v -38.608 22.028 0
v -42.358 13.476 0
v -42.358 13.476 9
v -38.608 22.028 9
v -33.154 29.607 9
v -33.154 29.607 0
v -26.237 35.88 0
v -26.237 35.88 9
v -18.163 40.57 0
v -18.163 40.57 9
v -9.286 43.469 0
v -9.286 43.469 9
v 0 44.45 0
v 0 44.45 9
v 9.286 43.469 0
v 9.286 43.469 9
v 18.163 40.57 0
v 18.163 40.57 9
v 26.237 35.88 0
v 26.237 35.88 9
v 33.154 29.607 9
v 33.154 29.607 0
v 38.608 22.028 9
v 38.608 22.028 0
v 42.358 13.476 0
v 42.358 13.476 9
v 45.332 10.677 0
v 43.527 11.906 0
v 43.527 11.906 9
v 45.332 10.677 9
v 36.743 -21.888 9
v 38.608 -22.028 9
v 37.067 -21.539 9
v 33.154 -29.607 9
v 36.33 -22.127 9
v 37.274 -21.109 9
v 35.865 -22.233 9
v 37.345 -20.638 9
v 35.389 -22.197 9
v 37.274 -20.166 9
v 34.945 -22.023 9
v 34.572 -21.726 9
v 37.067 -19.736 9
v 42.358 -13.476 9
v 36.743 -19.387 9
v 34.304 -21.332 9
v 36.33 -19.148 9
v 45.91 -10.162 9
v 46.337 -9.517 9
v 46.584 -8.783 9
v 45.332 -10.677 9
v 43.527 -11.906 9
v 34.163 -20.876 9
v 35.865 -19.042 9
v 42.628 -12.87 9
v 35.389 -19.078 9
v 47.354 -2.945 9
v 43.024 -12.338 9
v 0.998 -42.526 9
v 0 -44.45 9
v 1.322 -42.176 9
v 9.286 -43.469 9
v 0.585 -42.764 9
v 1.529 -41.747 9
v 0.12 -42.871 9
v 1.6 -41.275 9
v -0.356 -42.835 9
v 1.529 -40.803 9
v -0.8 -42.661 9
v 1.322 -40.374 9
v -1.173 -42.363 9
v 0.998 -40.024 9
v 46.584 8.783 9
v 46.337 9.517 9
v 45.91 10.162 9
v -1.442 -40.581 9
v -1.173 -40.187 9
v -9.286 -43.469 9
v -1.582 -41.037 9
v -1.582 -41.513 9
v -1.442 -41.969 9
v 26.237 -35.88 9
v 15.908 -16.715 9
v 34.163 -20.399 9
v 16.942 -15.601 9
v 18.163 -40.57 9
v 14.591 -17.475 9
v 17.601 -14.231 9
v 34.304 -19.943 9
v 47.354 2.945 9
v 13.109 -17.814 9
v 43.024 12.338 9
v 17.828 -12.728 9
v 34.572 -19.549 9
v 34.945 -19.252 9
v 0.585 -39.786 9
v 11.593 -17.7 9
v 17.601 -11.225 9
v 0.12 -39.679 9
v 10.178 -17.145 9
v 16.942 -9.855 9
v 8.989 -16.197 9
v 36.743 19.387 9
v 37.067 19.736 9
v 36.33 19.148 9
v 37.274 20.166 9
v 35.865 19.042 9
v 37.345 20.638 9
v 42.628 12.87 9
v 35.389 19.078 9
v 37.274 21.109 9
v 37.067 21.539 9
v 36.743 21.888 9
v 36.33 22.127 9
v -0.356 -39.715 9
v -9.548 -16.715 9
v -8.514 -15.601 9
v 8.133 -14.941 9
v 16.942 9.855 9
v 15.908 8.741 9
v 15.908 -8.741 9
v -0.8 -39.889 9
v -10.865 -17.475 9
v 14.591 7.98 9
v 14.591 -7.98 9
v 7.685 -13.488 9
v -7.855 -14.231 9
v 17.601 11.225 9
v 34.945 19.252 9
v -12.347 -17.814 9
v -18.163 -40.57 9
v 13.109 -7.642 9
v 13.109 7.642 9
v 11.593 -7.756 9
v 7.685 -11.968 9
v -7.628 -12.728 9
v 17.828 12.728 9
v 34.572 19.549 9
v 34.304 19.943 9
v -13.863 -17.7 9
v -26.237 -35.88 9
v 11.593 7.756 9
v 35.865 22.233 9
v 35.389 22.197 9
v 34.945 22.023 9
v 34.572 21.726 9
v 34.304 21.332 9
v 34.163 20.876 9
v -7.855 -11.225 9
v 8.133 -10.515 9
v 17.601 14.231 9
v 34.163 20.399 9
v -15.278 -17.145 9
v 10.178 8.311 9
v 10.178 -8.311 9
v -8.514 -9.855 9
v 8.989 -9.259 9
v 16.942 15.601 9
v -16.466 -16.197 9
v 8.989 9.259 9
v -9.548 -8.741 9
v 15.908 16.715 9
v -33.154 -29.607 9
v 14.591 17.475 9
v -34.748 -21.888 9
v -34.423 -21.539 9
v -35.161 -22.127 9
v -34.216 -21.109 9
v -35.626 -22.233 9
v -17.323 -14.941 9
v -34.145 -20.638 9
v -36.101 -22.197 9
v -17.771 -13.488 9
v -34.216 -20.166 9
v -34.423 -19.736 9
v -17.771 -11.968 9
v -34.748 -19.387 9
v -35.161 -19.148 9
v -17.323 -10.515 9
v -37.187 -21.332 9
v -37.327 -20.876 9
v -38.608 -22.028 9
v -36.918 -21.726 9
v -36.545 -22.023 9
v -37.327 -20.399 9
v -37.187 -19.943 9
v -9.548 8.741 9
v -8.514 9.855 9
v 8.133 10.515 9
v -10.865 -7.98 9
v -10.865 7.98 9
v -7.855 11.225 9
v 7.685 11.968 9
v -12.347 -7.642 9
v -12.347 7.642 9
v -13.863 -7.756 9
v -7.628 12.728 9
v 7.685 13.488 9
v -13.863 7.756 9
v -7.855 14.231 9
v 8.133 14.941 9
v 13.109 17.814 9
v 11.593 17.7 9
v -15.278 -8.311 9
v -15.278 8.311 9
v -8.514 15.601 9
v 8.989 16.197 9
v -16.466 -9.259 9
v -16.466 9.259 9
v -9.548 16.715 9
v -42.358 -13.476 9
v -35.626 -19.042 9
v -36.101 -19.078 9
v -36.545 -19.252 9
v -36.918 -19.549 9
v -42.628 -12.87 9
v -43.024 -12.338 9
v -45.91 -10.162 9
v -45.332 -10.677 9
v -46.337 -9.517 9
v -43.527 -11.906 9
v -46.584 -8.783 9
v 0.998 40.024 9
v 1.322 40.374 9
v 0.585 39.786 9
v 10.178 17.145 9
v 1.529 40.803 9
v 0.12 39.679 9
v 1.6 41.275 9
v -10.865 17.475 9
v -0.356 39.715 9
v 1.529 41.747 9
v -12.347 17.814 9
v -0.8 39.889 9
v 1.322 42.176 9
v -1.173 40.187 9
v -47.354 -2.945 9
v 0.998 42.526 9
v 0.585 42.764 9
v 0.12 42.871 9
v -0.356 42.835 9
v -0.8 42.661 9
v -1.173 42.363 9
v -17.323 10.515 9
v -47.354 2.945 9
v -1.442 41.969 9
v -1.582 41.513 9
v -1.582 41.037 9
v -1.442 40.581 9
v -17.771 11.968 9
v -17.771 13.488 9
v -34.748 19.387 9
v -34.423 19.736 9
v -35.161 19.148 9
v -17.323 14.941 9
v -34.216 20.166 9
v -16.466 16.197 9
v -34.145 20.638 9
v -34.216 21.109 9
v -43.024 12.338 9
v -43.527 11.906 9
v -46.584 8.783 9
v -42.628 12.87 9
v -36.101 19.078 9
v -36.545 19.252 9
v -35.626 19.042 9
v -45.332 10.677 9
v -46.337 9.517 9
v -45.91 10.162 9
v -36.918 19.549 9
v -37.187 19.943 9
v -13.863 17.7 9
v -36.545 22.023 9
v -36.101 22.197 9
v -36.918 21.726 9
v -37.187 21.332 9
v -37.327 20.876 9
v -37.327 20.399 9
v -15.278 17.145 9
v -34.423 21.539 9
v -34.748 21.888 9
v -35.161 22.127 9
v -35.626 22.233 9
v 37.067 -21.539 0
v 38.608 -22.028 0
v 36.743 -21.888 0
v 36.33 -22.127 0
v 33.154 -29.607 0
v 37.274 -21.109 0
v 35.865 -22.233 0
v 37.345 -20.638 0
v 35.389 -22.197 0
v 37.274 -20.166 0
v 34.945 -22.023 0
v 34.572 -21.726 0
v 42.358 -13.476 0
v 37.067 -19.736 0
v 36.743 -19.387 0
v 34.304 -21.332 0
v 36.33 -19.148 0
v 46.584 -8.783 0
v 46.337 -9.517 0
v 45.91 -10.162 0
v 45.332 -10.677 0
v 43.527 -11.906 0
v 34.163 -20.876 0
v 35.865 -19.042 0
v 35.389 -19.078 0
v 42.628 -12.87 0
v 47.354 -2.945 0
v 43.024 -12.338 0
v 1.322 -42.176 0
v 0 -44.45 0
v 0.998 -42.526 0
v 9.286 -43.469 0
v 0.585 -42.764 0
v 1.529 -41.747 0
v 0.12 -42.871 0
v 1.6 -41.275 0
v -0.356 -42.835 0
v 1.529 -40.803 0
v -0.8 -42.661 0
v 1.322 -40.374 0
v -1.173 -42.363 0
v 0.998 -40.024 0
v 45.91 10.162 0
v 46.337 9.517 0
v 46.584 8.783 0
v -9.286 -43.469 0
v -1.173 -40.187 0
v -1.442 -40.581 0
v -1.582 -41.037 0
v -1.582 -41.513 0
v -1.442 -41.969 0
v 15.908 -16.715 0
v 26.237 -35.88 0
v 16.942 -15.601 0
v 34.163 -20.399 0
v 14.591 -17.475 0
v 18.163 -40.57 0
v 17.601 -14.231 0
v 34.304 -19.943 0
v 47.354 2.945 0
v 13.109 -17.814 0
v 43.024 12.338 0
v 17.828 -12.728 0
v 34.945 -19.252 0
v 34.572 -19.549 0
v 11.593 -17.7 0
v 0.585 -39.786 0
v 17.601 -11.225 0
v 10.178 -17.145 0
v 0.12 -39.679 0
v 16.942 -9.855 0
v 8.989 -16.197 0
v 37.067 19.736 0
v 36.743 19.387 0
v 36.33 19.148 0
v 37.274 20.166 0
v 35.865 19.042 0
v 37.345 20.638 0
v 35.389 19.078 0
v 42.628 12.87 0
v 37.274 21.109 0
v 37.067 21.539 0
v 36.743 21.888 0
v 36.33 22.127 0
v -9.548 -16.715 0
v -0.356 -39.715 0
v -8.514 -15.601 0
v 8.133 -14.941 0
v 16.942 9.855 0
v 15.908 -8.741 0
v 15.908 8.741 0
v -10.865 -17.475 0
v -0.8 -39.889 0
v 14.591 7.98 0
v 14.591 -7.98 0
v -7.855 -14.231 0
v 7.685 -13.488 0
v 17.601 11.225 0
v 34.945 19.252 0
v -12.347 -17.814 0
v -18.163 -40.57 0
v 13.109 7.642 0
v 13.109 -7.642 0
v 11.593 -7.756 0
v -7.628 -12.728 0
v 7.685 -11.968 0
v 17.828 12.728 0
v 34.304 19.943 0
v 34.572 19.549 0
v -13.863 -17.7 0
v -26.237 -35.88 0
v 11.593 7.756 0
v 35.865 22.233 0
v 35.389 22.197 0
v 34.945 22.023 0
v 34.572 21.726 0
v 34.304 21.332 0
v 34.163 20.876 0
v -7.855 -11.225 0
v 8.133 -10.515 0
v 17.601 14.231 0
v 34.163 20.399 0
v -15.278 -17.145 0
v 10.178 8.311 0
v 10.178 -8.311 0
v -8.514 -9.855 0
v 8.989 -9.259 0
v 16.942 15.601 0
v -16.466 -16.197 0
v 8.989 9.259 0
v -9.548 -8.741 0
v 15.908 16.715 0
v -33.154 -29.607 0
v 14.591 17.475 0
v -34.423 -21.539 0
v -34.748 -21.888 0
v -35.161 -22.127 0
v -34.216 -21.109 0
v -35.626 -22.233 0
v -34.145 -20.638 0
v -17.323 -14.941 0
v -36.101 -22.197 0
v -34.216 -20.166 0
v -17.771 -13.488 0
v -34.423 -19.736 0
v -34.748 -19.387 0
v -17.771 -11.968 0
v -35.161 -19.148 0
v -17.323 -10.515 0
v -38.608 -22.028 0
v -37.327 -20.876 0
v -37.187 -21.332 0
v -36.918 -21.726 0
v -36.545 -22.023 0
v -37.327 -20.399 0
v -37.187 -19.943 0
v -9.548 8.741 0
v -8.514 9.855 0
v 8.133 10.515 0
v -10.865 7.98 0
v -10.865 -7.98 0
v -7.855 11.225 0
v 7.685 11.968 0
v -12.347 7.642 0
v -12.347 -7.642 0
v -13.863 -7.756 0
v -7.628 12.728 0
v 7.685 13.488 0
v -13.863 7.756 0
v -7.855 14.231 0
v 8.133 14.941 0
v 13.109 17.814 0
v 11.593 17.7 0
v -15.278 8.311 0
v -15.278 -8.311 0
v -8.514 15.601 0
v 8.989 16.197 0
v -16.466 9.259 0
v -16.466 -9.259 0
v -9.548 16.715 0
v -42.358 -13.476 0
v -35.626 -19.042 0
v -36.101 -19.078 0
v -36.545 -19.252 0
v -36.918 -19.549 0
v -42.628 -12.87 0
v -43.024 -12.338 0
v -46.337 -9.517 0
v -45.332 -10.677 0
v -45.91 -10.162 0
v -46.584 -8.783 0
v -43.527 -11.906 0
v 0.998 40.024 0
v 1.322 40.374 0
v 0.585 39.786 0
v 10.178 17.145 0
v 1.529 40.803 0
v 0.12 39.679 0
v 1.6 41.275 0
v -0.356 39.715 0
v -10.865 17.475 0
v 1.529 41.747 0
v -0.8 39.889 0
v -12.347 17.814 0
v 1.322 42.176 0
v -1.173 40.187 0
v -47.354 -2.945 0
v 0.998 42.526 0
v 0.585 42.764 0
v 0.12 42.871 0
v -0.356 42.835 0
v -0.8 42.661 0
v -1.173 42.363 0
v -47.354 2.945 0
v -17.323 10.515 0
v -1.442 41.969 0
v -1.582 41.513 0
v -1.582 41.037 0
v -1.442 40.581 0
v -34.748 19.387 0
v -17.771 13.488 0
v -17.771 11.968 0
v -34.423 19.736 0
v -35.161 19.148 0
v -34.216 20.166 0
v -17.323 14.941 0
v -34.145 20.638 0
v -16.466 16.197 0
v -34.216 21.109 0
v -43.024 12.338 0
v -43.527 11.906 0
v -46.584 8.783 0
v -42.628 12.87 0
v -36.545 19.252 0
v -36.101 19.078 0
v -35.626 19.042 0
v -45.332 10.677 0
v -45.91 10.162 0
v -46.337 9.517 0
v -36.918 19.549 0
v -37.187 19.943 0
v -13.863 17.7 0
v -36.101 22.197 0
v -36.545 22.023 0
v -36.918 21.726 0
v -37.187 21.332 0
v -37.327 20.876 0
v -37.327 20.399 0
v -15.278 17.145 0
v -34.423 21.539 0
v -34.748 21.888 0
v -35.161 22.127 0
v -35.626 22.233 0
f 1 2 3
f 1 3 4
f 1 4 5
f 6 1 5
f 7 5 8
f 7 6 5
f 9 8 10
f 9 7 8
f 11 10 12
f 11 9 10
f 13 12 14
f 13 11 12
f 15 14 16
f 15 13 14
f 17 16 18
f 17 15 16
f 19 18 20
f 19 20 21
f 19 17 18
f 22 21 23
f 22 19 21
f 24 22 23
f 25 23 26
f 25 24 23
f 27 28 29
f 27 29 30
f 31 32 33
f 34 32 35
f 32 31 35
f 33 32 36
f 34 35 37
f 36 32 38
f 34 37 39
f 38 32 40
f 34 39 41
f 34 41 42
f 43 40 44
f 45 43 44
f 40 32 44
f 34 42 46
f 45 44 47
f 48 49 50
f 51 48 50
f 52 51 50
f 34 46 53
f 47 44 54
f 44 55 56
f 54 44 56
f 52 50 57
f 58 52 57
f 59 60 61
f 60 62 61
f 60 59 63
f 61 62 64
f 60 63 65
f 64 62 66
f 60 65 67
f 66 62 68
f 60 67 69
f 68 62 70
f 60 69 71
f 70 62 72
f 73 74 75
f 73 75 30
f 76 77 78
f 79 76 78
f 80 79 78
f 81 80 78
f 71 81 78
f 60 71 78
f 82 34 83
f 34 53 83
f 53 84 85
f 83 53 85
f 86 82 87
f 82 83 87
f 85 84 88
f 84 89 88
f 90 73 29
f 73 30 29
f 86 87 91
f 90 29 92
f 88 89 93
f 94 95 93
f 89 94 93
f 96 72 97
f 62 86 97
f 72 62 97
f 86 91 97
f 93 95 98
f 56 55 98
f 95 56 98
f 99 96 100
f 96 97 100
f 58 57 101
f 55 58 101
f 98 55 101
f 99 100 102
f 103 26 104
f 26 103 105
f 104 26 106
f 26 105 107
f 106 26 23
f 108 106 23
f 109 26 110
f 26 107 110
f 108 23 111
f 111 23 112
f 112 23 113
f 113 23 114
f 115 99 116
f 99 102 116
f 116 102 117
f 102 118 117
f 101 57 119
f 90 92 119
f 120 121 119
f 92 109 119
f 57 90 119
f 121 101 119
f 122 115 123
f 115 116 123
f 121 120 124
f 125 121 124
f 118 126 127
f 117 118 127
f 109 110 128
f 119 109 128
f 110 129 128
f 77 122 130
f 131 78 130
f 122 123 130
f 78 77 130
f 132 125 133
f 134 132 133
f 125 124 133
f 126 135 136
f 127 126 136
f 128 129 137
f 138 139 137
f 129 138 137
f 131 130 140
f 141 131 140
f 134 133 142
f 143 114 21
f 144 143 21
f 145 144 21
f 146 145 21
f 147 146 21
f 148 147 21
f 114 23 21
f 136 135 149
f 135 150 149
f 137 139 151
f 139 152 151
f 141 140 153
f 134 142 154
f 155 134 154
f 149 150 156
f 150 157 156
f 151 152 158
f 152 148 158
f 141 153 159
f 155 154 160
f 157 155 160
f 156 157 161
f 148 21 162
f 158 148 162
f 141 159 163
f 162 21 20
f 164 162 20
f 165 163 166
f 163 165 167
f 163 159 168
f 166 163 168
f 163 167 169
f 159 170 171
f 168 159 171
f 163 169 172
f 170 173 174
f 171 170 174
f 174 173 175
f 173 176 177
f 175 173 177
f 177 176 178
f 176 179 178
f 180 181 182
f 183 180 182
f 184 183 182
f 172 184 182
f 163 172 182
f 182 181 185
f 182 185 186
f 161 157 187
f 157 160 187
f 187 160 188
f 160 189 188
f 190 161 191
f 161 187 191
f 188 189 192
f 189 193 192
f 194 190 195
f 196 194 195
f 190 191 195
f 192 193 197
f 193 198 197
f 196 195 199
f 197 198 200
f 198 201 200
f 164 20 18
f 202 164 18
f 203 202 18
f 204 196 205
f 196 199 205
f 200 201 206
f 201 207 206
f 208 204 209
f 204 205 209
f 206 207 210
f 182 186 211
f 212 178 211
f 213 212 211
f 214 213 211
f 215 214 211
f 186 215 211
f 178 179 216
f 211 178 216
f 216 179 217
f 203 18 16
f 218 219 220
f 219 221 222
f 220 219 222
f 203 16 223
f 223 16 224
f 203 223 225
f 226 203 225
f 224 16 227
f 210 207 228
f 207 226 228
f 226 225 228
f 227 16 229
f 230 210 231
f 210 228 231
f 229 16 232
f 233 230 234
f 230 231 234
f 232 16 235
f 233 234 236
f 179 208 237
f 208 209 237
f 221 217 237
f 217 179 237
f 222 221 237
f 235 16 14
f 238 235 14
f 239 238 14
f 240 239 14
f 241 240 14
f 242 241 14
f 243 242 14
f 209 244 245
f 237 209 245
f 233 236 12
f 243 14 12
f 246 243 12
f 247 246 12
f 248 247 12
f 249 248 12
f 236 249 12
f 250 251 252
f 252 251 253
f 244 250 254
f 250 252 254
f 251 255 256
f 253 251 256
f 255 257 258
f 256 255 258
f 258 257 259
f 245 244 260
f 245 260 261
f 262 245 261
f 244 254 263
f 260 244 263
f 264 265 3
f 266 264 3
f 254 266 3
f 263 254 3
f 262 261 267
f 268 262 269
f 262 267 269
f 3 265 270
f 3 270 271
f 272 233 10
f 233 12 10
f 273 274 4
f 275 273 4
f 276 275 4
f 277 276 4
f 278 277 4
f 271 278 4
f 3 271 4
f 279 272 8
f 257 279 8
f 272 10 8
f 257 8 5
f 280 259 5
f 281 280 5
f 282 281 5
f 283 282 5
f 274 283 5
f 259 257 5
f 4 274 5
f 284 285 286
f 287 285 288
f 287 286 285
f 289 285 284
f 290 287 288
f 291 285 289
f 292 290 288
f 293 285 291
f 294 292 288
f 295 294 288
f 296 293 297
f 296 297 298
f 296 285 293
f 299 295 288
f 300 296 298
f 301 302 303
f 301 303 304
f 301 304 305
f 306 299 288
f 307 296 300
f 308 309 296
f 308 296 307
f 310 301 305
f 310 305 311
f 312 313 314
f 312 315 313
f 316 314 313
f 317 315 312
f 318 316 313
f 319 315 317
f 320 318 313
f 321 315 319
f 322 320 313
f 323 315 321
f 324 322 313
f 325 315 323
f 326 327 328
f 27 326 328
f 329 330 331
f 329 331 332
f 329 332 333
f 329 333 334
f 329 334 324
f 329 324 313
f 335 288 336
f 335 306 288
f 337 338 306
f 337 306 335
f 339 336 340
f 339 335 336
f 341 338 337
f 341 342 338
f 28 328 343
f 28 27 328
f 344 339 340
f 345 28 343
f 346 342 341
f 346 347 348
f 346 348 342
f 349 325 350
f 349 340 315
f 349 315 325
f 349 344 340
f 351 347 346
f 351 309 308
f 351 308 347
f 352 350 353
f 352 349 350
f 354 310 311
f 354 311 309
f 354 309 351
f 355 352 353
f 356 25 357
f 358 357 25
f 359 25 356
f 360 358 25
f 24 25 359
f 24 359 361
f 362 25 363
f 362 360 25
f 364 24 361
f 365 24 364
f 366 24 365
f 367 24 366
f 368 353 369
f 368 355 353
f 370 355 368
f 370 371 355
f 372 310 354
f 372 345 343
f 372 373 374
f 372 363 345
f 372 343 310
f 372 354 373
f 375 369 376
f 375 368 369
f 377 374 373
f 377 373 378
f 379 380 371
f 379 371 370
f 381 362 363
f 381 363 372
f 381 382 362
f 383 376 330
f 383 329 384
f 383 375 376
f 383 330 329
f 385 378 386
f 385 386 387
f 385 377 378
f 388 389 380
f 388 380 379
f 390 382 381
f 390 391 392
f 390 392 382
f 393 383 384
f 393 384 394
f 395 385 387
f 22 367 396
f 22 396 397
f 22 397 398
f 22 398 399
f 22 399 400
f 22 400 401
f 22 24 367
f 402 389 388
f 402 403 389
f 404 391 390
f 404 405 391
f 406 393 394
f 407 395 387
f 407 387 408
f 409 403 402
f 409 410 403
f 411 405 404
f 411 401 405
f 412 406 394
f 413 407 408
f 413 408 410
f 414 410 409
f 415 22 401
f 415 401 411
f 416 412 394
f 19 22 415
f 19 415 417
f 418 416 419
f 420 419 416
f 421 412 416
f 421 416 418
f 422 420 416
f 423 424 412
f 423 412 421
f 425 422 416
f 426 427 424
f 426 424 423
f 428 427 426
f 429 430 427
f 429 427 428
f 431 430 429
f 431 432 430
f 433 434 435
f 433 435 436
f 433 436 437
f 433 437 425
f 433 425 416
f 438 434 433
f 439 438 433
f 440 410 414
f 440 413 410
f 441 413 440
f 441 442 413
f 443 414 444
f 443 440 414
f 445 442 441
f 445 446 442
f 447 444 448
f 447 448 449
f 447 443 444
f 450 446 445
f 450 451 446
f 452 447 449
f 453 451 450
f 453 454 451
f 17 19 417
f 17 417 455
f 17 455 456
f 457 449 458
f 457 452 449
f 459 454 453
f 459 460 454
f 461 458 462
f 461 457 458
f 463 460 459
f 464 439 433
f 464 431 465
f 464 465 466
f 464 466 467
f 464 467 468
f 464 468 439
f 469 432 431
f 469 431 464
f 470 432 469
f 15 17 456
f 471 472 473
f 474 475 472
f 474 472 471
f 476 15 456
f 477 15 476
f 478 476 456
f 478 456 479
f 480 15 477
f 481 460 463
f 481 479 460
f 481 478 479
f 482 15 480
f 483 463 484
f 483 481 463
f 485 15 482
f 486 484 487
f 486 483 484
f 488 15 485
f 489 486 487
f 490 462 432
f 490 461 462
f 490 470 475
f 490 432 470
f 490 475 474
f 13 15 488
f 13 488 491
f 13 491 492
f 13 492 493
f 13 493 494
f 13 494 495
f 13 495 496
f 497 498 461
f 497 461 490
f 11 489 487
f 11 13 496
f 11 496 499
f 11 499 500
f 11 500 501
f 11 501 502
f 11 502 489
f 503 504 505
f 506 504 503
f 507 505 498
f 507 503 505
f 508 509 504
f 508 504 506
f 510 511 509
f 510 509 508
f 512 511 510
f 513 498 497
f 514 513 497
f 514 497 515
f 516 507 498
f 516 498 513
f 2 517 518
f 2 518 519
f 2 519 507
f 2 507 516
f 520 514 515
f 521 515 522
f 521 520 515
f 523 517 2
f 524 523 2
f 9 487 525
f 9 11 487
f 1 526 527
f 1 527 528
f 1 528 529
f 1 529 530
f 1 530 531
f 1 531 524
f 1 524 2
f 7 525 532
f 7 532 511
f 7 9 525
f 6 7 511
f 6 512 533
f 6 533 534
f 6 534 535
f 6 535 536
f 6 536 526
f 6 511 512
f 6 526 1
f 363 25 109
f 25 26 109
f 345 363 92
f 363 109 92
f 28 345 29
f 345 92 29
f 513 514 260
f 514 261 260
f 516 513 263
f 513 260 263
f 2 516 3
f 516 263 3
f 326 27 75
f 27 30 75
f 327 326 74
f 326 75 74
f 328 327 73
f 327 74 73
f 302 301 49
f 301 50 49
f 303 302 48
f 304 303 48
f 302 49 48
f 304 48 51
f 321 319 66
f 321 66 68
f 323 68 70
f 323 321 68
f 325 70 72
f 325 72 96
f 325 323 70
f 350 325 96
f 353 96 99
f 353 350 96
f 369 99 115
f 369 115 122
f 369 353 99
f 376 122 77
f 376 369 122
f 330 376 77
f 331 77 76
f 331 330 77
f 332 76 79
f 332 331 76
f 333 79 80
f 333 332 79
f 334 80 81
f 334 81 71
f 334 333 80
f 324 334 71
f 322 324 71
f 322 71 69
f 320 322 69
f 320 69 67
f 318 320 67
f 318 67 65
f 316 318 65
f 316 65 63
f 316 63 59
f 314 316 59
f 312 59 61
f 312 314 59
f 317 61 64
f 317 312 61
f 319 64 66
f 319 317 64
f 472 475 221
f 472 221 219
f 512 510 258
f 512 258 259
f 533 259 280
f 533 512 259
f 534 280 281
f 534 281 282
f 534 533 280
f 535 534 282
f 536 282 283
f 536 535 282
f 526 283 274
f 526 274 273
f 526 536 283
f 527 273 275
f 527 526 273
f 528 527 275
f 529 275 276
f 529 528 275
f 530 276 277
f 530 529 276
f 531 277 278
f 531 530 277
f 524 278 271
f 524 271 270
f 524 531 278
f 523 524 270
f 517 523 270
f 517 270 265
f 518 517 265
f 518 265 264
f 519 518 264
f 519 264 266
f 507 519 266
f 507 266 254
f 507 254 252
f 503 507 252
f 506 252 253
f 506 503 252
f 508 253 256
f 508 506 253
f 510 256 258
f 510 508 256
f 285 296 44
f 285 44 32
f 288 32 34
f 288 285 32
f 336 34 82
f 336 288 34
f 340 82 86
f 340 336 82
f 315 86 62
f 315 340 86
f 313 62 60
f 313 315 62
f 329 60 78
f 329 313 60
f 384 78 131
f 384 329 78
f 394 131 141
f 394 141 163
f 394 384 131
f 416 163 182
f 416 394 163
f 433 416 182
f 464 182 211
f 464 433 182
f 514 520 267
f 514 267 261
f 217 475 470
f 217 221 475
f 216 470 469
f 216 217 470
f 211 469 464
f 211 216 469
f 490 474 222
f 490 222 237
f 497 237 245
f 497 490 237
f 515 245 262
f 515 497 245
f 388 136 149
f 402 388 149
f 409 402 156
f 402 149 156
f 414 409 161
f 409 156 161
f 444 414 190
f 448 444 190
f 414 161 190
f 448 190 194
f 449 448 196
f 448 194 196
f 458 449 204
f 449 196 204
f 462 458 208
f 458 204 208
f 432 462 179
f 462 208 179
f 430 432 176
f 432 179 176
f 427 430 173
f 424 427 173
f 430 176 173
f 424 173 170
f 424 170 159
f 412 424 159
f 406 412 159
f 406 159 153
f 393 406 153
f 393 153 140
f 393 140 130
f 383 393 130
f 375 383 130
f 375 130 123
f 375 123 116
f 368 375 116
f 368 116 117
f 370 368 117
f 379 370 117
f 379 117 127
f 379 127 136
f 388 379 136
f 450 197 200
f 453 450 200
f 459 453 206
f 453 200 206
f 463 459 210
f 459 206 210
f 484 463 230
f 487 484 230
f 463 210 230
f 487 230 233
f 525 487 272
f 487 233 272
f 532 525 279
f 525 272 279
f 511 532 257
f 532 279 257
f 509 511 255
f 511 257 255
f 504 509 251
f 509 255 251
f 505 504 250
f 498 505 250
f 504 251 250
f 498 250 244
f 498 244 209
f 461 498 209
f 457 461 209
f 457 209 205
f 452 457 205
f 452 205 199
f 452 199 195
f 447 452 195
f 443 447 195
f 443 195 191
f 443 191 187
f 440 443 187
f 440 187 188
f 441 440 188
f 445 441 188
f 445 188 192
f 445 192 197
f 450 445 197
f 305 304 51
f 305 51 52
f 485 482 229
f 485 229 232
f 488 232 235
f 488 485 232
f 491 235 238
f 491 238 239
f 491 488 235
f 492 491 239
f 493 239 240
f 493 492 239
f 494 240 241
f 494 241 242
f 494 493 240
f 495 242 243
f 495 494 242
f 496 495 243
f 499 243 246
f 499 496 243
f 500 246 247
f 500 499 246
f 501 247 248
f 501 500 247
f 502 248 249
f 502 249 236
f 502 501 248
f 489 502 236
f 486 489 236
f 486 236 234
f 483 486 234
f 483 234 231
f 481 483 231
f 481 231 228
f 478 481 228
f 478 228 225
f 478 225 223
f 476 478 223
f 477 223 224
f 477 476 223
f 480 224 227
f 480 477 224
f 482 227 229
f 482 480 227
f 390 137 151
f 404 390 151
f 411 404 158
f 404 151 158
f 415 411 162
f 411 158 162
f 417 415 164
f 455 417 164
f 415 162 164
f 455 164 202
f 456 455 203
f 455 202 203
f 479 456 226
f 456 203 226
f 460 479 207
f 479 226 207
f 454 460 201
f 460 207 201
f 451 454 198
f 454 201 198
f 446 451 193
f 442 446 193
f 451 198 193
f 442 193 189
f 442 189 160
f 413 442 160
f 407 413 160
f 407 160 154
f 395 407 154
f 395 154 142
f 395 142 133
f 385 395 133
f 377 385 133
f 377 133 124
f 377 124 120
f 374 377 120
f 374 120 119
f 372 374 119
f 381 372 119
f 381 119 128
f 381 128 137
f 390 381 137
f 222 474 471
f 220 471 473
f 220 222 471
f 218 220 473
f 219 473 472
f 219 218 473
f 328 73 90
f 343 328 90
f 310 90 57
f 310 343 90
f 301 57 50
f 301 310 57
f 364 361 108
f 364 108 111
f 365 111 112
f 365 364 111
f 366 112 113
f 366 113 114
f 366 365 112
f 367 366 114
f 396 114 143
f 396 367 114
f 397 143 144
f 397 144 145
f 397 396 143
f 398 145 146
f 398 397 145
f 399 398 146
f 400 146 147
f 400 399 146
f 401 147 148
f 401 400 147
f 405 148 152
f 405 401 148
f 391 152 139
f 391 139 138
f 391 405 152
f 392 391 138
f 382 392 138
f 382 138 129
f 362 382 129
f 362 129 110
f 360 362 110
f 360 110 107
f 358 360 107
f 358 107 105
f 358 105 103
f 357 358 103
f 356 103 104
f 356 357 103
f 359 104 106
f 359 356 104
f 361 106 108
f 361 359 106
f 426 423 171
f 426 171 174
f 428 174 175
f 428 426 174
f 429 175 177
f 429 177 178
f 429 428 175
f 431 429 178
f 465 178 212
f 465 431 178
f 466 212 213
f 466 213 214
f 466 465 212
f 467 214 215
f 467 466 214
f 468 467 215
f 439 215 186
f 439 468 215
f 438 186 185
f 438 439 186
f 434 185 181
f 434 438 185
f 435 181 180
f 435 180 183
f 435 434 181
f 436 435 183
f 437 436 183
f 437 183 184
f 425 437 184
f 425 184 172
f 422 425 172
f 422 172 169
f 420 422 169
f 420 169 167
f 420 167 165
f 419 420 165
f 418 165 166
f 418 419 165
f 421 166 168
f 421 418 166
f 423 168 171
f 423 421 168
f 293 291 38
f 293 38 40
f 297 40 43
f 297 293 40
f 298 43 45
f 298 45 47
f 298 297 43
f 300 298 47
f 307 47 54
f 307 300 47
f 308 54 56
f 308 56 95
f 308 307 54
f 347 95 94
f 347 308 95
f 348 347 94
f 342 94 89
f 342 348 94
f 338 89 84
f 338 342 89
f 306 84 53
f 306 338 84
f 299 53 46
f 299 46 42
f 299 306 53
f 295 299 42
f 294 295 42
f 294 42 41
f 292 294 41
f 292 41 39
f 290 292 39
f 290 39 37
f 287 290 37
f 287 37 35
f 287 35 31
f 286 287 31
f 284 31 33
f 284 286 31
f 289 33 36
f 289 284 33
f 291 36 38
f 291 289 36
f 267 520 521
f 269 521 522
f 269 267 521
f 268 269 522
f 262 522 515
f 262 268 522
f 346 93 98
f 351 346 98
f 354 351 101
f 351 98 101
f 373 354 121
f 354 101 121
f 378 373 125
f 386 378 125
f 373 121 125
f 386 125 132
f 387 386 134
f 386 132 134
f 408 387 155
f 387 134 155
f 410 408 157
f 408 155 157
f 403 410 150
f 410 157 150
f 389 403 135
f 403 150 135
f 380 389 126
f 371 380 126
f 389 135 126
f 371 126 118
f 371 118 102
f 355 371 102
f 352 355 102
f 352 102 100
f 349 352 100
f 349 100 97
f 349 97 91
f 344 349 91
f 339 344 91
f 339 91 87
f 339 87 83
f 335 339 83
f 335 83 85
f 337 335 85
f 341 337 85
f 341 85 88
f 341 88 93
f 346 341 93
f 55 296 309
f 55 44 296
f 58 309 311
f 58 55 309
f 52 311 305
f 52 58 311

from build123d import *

# Parameters (mm, degrees)
SKETCH1_R           = 1.6
BOSS_EXTRUDE1_DEPTH = 9
FILLET1_R           = 3
SKETCH2_R           = 5.1
CUT_EXTRUDE1_DEPTH  = 10


with BuildPart() as part:
    # Sketch1 → Boss-Extrude1 (new body)
    with BuildSketch(Plane.XY):
        with BuildLine():
            Line((-46.324821937, 10), (-42.656212912, 12.5))
            ThreePointArc((-42.656212912, 12.5), (0, 44.45), (42.656212912, 12.5))
            Line((42.656212912, 12.5), (46.324821937, 10))
            ThreePointArc((46.324821937, 10), (47.45, 0), (46.324821937, -10))
            Line((46.324821937, -10), (42.656212912, -12.5))
            ThreePointArc((42.656212912, -12.5), (0, -44.45), (-42.656212912, -12.5))
            Line((-42.656212912, -12.5), (-46.324821937, -10))
            ThreePointArc((-46.324821937, -10), (-47.45, 0), (-46.324821937, 10))
        make_face()
        with Locations((0, 41.275)):
            Circle(SKETCH1_R, mode=Mode.SUBTRACT)
        with Locations((35.745198541, 20.6375)):
            Circle(SKETCH1_R, mode=Mode.SUBTRACT)
        with Locations((35.745198541, -20.6375)):
            Circle(SKETCH1_R, mode=Mode.SUBTRACT)
        with Locations((0, -41.275)):
            Circle(SKETCH1_R, mode=Mode.SUBTRACT)
        with Locations((-35.745198541, -20.6375)):
            Circle(SKETCH1_R, mode=Mode.SUBTRACT)
        with Locations((-35.745198541, 20.6375)):
            Circle(SKETCH1_R, mode=Mode.SUBTRACT)
    extrude(amount=BOSS_EXTRUDE1_DEPTH)

    # Fillet1
    fillet1_edges = [part.edges().sort_by_distance(p)[0] for p in [
        (46.324821937, -10, 4.5),
        (42.656212912, -12.5, 4.5),
        (-42.656212912, -12.5, 4.5),
        (-46.324821937, -10, 4.5),
        (-46.324821937, 10, 4.5),
        (-42.656212912, 12.5, 4.5),
        (42.656212912, 12.5, 4.5),
        (46.324821937, 10, 4.5),
    ]]
    fillet(fillet1_edges, radius=FILLET1_R)

    # Sketch2 → Cut-Extrude1 (cut, through all)
    with BuildSketch(Plane.XY.offset(9)):
        with Locations((12.727922061, 12.727922061)):
            Circle(SKETCH2_R)
        with Locations((12.727922061, -12.727922061)):
            Circle(SKETCH2_R)
        with Locations((-12.727922061, -12.727922061)):
            Circle(SKETCH2_R)
        with Locations((-12.727922061, 12.727922061)):
            Circle(SKETCH2_R)
    extrude(amount=-CUT_EXTRUDE1_DEPTH, mode=Mode.SUBTRACT)


solid = part.part
